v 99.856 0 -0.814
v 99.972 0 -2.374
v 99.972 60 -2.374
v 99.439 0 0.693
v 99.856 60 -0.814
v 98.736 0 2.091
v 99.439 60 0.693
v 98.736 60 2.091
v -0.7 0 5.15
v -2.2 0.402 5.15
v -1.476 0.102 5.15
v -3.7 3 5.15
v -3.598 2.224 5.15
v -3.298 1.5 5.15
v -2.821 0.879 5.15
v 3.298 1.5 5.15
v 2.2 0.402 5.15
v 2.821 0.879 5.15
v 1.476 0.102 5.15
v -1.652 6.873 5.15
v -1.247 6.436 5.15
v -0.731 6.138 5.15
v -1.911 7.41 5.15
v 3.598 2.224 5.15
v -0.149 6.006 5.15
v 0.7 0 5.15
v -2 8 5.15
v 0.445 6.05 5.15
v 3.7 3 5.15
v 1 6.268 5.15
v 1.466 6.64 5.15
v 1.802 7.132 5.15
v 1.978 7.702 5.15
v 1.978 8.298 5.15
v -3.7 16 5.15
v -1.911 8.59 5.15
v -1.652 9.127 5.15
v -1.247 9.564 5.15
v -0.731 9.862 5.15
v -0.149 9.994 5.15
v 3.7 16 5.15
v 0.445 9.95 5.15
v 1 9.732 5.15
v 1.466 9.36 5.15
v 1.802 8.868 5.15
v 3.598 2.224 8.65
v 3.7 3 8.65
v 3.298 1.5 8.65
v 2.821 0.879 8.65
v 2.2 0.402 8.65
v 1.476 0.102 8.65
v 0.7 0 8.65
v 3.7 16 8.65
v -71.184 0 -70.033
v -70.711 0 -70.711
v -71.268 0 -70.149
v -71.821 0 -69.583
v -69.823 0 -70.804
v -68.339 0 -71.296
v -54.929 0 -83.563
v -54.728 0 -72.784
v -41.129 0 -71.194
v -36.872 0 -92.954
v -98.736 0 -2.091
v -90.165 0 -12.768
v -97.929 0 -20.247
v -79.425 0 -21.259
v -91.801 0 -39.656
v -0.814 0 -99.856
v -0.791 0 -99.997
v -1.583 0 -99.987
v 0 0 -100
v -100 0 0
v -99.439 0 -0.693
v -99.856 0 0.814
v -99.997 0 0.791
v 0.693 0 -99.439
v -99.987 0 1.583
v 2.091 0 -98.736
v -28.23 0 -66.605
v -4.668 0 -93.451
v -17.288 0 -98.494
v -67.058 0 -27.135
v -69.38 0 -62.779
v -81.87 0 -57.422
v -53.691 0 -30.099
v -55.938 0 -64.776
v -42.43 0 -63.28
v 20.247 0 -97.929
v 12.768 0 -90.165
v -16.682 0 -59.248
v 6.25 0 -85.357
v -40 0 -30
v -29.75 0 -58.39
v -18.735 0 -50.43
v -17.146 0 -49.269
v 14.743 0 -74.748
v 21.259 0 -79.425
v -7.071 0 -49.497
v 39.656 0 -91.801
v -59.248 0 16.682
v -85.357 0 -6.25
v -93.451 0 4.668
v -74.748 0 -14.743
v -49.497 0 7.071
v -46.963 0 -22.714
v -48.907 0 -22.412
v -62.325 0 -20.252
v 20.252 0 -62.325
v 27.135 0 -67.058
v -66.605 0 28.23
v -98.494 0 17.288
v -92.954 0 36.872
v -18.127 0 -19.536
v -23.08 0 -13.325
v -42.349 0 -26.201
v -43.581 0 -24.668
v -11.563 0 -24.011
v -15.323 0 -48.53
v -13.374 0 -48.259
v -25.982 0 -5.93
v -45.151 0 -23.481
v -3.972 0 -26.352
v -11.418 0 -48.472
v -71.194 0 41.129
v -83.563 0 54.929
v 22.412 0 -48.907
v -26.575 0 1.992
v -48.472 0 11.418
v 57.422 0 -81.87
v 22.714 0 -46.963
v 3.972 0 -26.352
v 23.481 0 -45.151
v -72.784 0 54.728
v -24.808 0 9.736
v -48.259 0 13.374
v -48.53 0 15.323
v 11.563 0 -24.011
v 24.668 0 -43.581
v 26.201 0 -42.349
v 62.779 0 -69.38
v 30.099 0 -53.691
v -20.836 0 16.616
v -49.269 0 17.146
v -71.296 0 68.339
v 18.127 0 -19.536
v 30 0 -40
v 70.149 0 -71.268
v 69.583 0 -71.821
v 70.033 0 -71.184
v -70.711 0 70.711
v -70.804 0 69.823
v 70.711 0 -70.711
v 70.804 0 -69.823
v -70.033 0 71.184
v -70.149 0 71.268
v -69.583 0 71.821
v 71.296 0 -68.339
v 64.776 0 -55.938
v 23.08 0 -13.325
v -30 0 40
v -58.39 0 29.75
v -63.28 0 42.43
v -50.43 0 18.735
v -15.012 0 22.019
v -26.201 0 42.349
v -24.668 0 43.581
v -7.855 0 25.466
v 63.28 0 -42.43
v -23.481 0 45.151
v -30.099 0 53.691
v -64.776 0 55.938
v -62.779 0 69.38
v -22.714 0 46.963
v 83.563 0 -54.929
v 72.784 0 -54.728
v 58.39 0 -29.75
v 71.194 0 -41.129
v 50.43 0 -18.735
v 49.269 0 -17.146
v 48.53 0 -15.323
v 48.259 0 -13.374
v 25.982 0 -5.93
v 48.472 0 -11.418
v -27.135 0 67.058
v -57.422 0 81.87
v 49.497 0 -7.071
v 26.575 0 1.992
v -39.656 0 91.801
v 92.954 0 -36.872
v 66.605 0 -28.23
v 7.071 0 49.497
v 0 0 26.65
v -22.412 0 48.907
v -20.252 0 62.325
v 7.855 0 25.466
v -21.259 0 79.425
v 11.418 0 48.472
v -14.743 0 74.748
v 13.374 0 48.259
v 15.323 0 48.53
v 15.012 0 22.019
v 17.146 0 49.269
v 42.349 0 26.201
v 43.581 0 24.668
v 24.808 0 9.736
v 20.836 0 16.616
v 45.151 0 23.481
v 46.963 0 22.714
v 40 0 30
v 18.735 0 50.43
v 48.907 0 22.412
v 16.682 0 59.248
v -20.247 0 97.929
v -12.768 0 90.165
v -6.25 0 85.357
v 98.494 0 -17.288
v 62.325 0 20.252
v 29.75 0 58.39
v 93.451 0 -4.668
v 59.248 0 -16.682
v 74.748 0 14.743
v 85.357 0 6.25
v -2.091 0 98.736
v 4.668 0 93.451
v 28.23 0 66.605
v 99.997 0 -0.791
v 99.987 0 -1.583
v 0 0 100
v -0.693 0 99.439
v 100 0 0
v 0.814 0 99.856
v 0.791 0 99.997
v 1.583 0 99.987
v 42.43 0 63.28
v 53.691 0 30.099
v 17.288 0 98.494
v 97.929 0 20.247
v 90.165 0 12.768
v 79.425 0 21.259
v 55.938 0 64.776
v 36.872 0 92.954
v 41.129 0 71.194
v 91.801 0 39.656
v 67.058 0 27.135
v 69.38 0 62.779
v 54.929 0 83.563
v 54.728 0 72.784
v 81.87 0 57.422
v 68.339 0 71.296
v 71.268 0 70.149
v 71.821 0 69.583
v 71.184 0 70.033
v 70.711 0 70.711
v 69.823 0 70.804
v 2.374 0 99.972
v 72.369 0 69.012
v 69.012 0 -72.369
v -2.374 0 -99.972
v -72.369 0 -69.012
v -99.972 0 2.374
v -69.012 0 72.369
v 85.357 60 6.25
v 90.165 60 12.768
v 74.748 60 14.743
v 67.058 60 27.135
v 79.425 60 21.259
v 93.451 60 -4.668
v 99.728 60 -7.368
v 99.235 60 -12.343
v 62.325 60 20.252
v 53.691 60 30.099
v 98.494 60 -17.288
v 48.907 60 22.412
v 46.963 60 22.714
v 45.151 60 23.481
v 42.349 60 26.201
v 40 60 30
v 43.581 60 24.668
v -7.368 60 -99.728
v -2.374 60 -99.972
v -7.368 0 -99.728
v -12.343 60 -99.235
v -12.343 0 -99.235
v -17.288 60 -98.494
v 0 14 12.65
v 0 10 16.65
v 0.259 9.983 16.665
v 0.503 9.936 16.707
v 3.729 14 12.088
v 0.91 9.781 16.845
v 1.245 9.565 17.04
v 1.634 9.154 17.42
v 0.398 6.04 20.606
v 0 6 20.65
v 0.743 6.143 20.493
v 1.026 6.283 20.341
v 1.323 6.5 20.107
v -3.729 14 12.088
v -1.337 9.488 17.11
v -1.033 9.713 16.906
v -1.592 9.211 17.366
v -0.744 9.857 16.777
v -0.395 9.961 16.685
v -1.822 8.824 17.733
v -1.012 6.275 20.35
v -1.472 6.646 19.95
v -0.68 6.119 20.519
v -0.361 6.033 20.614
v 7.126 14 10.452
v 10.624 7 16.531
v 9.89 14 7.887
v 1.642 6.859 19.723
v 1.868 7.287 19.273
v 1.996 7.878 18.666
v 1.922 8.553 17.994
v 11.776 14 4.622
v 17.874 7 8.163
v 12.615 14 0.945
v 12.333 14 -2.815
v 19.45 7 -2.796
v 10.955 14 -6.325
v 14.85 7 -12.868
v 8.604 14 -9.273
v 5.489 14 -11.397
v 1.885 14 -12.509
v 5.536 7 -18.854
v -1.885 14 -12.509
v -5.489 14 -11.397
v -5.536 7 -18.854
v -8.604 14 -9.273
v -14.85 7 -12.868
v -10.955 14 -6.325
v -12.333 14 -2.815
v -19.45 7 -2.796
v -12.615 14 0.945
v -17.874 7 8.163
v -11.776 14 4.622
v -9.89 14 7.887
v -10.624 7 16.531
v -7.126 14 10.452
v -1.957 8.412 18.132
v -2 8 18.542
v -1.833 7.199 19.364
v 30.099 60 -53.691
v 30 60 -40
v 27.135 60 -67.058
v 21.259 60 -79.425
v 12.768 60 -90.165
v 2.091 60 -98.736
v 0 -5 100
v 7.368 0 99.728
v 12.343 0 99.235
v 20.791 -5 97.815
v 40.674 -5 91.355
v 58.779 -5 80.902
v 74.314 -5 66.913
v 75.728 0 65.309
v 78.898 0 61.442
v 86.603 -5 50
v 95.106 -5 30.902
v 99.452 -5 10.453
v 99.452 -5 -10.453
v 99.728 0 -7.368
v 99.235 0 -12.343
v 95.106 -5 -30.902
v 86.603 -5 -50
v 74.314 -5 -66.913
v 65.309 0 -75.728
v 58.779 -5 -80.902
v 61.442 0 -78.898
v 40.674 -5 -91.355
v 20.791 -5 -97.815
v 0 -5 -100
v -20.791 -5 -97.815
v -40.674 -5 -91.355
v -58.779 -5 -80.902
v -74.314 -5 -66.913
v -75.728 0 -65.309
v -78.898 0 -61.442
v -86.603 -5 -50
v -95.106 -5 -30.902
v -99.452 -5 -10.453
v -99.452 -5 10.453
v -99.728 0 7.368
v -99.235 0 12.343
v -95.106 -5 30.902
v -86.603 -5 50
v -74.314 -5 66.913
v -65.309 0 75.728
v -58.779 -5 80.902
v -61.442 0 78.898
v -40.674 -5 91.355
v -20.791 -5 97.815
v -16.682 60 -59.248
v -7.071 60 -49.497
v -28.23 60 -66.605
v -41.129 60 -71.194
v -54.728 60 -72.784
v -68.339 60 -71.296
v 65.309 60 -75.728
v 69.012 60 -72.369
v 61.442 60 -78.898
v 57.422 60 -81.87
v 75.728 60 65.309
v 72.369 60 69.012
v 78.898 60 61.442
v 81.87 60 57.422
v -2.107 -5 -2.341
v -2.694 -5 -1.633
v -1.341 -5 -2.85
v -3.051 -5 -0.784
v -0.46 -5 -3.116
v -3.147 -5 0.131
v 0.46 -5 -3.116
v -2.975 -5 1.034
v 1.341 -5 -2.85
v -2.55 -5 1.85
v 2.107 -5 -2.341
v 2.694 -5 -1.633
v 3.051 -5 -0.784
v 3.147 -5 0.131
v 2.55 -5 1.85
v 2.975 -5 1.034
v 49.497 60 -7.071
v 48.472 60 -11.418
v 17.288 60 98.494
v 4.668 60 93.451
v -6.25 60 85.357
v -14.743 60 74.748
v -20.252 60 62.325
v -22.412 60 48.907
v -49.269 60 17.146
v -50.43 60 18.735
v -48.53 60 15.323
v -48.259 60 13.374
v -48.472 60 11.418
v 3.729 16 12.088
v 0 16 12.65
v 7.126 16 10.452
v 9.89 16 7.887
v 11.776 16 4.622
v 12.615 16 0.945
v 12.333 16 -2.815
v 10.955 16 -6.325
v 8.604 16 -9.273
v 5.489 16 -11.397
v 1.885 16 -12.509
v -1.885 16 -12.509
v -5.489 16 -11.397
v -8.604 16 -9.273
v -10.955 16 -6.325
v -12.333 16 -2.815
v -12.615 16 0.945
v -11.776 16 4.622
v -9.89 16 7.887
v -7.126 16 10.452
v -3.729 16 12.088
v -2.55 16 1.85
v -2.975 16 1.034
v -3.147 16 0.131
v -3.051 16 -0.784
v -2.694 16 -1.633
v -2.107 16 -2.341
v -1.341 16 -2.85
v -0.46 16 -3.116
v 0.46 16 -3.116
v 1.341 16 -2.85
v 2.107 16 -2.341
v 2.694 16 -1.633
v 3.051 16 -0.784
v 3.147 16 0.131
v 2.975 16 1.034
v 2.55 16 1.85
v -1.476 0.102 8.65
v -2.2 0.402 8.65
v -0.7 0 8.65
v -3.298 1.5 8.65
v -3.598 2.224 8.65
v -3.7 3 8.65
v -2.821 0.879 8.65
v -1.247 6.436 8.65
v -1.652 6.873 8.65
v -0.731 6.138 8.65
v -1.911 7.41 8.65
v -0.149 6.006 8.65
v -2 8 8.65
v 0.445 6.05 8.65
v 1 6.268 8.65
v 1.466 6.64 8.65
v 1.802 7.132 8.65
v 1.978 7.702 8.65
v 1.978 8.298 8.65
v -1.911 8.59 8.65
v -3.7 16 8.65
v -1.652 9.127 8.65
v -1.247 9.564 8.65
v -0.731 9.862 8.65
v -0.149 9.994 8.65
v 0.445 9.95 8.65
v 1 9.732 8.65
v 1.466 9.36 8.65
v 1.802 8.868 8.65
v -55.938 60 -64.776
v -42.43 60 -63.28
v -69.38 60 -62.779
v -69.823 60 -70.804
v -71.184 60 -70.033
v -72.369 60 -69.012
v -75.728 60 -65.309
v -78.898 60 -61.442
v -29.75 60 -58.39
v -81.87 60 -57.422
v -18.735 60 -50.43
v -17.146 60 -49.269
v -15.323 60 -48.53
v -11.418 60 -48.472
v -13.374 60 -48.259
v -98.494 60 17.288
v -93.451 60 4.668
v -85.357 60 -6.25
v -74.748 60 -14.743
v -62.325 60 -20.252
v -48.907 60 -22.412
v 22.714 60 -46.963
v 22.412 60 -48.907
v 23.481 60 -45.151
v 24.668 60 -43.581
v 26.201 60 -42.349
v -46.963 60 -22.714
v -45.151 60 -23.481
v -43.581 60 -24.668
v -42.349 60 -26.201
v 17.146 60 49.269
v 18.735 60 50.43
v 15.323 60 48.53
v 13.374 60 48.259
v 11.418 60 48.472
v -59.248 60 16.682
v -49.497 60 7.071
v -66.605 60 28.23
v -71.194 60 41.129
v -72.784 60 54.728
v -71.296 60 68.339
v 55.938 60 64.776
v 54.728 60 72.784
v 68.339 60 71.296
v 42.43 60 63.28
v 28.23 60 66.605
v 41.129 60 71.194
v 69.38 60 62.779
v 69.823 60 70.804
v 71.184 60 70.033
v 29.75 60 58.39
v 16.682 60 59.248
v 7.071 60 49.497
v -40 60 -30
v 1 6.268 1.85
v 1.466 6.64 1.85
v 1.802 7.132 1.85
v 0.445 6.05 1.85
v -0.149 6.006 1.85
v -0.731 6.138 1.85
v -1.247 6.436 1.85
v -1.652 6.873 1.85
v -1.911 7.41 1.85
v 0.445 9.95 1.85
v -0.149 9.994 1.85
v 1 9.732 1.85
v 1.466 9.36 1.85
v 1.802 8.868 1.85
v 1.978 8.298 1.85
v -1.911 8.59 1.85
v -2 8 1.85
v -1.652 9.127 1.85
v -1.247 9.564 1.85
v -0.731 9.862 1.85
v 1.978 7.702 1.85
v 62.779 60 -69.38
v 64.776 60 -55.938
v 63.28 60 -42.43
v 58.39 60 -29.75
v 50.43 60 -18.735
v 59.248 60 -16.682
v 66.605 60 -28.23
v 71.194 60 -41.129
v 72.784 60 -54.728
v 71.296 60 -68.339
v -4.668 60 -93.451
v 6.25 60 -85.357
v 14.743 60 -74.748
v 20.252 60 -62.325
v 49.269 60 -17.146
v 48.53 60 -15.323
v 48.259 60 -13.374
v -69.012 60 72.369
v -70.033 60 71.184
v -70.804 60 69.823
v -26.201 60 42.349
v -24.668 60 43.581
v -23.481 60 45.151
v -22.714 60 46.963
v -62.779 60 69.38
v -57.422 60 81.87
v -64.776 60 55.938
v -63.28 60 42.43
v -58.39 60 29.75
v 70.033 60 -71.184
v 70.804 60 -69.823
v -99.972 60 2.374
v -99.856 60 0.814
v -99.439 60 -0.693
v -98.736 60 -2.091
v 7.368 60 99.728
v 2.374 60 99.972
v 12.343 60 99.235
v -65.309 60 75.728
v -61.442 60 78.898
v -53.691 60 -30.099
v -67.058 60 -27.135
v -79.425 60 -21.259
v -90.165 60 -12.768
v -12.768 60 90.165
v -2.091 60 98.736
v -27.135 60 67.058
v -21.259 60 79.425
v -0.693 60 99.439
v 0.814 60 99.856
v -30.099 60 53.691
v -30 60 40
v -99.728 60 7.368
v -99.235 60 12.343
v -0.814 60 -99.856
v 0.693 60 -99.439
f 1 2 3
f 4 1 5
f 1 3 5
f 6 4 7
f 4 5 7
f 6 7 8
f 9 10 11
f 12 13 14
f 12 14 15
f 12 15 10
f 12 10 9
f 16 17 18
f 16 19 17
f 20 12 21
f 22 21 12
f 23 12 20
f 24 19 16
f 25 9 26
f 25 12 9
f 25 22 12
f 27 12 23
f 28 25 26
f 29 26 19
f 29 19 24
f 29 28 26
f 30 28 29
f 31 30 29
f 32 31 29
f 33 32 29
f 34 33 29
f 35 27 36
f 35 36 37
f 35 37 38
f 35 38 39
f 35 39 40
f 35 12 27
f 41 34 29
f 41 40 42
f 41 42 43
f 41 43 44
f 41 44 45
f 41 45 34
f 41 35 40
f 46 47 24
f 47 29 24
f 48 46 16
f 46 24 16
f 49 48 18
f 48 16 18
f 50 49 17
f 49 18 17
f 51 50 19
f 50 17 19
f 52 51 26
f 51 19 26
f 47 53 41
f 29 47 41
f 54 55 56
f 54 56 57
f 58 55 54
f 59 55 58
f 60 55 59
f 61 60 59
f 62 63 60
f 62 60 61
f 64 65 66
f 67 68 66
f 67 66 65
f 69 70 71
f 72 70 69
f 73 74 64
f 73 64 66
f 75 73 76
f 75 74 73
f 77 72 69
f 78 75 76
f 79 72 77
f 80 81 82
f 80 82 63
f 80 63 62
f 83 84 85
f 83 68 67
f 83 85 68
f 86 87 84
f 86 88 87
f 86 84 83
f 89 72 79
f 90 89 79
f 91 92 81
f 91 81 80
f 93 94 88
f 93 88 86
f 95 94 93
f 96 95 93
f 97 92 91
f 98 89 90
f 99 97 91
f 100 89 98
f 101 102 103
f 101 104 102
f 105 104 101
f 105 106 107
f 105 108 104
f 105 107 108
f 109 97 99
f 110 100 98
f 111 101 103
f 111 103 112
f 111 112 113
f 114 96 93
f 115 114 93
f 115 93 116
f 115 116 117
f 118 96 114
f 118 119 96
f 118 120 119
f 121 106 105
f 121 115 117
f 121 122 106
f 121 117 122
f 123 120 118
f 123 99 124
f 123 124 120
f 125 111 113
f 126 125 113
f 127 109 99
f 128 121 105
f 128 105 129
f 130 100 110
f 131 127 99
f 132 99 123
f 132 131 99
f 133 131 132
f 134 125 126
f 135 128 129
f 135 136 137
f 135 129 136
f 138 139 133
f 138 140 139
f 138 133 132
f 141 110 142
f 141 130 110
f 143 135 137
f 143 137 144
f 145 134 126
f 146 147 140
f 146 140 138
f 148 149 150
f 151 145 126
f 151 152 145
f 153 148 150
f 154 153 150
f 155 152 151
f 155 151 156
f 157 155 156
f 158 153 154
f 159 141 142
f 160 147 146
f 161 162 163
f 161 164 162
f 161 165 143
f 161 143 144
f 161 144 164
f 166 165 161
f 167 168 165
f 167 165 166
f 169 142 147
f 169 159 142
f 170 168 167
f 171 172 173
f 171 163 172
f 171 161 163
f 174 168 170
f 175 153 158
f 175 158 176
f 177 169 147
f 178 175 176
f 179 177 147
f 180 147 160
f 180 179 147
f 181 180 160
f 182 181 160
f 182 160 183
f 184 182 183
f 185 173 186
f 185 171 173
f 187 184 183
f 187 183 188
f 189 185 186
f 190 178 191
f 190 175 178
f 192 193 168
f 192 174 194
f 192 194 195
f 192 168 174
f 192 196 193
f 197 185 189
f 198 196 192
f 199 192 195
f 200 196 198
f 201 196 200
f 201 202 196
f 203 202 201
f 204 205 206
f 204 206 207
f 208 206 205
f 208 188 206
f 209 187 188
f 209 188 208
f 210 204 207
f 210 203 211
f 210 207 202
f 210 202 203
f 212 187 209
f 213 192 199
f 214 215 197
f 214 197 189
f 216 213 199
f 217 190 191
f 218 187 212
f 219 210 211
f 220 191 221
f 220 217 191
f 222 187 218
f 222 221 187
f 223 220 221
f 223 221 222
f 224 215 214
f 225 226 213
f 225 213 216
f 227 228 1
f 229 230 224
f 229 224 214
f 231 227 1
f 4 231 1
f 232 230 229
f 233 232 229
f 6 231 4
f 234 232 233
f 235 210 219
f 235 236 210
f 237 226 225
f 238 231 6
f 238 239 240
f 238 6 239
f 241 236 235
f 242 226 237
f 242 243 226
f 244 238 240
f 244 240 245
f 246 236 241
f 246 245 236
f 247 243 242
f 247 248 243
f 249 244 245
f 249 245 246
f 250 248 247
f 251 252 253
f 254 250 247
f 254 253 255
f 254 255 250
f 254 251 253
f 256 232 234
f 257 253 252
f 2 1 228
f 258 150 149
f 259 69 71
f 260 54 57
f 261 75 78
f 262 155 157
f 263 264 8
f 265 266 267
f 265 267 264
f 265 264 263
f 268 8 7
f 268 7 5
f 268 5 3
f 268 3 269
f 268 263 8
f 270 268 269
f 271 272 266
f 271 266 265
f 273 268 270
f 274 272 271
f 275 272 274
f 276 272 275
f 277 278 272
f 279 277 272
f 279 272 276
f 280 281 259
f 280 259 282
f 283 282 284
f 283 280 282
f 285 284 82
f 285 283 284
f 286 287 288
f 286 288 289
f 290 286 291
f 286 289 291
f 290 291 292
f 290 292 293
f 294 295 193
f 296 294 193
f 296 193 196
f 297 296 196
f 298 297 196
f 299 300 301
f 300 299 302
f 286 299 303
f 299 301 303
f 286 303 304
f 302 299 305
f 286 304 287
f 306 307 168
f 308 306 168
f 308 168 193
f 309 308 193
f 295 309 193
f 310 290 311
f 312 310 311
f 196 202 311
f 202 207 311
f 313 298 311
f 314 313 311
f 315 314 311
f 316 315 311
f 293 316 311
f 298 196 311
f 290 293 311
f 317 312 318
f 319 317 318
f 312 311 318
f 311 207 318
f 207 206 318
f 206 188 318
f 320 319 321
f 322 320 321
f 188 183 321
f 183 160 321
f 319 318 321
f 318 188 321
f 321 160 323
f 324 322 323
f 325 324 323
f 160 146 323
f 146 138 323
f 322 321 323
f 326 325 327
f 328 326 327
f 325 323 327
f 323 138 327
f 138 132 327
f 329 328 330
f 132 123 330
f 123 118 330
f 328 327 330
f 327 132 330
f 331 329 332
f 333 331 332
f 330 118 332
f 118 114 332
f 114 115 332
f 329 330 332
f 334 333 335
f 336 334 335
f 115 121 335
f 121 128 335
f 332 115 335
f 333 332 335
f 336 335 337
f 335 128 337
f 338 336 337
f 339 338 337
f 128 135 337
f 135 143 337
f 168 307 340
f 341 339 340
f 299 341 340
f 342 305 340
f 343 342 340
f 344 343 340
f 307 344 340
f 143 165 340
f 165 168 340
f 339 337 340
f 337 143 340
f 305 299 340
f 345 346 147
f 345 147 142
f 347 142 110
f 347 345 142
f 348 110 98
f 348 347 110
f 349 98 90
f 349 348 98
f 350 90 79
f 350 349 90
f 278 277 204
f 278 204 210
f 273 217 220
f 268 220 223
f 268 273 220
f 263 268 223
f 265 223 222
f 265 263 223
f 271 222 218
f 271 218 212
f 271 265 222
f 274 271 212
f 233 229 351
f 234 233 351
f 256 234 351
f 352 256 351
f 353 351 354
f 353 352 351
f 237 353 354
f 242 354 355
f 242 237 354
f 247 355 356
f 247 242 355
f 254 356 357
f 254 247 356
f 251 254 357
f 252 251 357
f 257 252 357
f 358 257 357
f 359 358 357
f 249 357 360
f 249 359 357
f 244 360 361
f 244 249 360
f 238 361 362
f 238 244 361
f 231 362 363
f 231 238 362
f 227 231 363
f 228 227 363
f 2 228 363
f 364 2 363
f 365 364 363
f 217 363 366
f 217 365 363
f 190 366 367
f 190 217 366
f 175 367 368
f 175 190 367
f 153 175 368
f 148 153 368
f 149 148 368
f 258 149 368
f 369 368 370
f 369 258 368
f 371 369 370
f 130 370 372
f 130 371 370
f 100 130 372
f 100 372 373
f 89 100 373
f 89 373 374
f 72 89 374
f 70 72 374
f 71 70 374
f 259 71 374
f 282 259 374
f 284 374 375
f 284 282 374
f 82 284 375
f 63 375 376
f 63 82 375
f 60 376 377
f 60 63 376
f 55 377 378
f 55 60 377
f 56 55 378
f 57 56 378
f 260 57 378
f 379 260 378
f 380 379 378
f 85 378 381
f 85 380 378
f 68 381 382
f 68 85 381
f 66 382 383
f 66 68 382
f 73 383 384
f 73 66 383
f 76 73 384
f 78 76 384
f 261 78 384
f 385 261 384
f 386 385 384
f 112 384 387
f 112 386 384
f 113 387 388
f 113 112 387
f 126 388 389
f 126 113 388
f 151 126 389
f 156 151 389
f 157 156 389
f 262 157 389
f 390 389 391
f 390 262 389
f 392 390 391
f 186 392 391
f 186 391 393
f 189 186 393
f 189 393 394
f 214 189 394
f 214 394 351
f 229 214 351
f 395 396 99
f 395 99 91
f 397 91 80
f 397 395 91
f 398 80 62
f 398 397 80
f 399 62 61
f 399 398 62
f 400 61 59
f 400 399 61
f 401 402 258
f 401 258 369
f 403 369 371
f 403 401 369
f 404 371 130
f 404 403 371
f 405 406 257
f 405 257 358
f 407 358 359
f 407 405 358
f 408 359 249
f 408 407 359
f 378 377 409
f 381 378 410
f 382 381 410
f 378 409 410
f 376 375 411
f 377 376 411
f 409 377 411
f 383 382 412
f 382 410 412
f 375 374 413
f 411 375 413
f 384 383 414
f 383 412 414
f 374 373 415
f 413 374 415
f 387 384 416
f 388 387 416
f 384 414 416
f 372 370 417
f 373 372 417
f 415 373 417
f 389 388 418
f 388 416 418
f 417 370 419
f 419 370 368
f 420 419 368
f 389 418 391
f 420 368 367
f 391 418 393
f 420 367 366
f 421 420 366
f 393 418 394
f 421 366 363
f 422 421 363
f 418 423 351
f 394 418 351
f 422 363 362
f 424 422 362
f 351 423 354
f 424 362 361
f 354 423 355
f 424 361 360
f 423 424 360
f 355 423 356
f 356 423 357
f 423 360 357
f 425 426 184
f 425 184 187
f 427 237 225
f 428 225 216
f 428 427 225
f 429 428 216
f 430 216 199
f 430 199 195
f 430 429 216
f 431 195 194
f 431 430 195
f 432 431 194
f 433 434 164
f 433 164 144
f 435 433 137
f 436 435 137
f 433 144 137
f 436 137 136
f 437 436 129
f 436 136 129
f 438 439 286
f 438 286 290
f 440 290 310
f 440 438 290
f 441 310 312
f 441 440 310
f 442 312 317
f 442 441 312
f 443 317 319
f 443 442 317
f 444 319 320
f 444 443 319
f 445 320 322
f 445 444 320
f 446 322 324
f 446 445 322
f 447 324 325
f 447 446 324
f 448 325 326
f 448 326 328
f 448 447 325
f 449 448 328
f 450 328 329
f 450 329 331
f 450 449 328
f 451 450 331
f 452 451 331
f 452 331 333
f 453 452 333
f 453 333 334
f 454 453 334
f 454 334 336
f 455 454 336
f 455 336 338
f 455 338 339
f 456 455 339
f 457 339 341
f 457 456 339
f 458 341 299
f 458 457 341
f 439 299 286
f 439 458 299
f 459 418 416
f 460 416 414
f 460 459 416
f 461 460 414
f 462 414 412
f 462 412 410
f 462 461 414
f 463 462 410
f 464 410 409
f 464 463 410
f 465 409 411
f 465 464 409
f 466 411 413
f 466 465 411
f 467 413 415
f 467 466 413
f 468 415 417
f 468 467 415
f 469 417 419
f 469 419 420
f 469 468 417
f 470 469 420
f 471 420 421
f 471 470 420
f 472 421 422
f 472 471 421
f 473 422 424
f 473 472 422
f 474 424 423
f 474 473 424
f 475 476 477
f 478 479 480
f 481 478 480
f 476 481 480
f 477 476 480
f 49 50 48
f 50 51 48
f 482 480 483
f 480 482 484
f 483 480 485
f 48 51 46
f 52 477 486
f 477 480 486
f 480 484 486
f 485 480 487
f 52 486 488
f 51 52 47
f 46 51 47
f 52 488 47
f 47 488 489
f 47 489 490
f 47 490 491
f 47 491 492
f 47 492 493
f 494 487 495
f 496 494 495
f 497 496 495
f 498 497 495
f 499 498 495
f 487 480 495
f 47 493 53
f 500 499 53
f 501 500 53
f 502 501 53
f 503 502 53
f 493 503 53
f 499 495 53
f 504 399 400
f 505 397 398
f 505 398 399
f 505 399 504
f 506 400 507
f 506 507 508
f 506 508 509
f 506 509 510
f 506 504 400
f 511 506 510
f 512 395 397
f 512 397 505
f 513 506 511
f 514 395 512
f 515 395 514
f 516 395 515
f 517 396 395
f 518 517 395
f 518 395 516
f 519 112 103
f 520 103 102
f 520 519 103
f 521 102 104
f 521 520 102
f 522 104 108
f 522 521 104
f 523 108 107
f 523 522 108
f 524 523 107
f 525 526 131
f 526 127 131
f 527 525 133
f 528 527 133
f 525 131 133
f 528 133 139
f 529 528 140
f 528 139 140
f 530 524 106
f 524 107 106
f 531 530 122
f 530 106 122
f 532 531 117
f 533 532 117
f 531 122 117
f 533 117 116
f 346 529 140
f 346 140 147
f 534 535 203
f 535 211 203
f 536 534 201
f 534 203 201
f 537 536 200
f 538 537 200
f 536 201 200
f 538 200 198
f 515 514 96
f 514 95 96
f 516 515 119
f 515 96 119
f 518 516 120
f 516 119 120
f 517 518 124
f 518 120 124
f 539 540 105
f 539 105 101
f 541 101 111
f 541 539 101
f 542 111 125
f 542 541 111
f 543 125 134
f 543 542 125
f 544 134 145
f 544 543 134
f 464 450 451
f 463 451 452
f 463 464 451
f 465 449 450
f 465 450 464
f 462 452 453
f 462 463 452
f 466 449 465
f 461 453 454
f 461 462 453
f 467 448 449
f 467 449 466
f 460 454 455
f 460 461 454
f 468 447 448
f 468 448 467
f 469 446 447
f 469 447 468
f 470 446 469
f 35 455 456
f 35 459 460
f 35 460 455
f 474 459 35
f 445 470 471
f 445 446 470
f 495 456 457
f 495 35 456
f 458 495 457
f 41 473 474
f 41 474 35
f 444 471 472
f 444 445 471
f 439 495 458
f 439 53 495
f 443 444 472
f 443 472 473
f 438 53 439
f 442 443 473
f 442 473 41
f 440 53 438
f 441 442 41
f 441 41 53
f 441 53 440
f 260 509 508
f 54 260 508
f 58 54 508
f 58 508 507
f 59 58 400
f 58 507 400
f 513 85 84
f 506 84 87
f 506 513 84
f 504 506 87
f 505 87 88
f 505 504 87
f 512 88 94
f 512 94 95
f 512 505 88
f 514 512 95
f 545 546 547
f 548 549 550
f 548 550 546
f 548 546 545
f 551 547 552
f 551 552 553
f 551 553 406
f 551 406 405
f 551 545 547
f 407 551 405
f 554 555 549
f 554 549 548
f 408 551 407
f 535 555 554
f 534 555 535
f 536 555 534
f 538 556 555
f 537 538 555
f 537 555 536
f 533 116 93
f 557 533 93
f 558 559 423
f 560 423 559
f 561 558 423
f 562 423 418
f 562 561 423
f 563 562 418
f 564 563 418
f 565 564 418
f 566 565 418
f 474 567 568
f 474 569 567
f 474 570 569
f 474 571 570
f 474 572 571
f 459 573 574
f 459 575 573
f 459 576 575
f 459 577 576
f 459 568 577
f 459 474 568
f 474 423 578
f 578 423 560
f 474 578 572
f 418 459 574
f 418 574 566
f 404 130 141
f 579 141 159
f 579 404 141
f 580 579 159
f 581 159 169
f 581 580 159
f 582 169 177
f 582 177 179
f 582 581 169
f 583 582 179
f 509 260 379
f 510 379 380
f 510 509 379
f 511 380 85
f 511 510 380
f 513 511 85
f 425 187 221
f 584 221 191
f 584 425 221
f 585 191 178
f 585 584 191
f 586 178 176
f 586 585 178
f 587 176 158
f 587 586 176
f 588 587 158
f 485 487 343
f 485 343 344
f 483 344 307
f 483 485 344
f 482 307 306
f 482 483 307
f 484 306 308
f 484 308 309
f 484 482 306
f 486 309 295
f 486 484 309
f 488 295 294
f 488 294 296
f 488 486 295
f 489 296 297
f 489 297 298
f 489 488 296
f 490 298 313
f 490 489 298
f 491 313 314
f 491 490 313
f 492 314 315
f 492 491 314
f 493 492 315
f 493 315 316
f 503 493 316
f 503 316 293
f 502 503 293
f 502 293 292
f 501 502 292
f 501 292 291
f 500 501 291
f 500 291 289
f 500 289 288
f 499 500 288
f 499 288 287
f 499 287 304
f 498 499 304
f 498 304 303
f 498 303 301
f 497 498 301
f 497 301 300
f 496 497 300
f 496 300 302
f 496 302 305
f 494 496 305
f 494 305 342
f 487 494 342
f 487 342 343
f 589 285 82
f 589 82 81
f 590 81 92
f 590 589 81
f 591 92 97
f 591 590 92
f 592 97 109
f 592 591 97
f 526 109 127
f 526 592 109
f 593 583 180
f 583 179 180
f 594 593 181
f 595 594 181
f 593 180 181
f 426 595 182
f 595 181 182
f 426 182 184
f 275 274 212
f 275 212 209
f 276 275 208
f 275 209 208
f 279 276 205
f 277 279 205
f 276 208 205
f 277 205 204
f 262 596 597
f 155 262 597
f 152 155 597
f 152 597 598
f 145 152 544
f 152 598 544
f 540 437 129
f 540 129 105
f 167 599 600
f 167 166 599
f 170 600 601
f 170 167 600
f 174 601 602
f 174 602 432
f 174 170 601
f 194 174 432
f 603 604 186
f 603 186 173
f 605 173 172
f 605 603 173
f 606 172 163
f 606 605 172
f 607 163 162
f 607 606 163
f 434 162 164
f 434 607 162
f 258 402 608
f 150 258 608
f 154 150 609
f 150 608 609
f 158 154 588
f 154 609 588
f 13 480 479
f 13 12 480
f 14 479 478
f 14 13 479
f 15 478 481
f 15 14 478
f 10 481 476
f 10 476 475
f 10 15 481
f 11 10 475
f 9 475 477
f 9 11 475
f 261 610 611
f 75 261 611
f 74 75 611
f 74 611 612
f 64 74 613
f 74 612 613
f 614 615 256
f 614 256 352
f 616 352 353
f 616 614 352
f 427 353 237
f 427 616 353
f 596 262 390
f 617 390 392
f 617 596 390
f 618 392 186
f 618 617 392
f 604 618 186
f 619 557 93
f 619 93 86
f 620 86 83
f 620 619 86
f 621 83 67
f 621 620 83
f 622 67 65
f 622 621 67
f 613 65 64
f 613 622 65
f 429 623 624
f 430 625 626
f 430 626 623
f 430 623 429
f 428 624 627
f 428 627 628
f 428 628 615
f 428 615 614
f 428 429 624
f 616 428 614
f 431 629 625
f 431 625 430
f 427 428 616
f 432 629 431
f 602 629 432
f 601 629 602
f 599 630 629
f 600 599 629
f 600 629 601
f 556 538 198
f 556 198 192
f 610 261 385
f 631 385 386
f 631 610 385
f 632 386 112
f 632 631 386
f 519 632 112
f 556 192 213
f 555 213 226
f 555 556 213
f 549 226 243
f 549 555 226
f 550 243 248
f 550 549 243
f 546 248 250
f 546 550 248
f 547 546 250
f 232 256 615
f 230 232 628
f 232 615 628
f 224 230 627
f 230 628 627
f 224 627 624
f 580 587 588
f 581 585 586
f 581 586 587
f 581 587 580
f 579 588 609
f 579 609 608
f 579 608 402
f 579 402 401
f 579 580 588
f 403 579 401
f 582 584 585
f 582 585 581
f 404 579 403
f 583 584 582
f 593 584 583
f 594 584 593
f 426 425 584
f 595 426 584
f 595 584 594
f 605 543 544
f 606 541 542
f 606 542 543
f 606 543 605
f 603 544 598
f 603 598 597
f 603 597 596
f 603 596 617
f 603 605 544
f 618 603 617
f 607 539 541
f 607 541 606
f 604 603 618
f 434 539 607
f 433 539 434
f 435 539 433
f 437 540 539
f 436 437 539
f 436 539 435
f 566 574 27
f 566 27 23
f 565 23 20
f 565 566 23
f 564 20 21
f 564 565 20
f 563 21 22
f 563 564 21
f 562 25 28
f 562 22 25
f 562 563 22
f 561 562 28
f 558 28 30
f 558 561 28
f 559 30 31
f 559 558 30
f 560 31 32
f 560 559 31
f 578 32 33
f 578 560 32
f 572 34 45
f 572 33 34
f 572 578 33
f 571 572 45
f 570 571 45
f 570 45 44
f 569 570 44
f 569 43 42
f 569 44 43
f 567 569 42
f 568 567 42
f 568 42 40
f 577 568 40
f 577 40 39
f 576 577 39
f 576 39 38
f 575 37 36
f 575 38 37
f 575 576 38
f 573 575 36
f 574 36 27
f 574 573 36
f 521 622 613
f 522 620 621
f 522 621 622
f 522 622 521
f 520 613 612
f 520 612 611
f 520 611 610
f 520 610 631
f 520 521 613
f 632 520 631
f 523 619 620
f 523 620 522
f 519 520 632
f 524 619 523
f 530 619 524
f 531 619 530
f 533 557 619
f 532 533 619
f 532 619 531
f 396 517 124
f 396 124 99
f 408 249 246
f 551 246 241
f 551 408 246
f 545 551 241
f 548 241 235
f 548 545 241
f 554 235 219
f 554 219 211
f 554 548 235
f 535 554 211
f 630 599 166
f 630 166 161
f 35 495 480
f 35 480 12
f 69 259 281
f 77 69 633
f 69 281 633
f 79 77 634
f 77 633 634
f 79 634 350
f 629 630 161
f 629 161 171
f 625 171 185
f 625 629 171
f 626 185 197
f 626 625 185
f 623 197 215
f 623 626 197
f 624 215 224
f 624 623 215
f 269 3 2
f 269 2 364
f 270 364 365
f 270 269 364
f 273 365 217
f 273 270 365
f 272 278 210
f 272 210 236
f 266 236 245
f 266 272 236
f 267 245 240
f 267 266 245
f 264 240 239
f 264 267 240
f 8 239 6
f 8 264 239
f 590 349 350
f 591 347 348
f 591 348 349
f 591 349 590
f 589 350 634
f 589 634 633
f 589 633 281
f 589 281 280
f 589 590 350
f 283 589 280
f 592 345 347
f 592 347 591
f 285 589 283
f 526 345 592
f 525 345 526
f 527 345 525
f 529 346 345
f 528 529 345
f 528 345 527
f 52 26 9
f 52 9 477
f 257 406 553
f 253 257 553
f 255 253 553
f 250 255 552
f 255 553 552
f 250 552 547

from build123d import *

# Parameters (mm, degrees)
SKETCH1_R                = 100
BOSS_EXTRUDE1_DEPTH      = 5
BOSS_EXTRUDE2_START      = 16
SKETCH1_3_R              = 12.65
SKETCH1_3_W              = 7.4
SKETCH1_3_H              = 3.5
BOSS_EXTRUDE2_DEPTH      = 16
CHAMFER1_SIZE            = 14
CUT_EXTRUDE1_DEPTH       = 146.988090268
CUT_EXTRUDE1_DEPTH_BACK  = 5.15
SKETCH3_R                = 2
FILLET1_R                = 3
BOSS_EXTRUDE3_START      = 60
BOSS_EXTRUDE3_DEPTH      = 60
FILLET3_R                = 8
FILLET4_R                = 8
CIRPATTERN1_COUNT        = 8
FILLET3_OF_CIRPATTERN1_R = 8
FILLET4_OF_CIRPATTERN1_R = 8


with BuildPart() as part:
    # Sketch1 → Boss-Extrude1 (new body)
    with BuildSketch(Plane(origin=(0, 0, 0), x_dir=(1, 0, 0), z_dir=(0, 1, 0))):
        with Locations(Location((0, 0, 0), (0, 0, 270))):
            Circle(SKETCH1_R)
        with BuildLine():
            Line((2.549509757, -1.85), (-2.549509757, -1.85))
            ThreePointArc((-2.549509757, -1.85), (0, 3.15), (2.549509757, -1.85))
        make_face(mode=Mode.SUBTRACT)
    extrude(amount=-BOSS_EXTRUDE1_DEPTH)

    # Sketch1<3> → Boss-Extrude2 (add)
    with BuildSketch(Plane(origin=(0, 0, 0), x_dir=(1, 0, 0), z_dir=(0, 1, 0)).offset(BOSS_EXTRUDE2_START)):
        with Locations(Location((0, 0, 0), (0, 0, 270))):
            Circle(SKETCH1_3_R)
        with BuildLine():
            Line((2.549509757, -1.85), (-2.549509757, -1.85))
            ThreePointArc((-2.549509757, -1.85), (0, 3.15), (2.549509757, -1.85))
        make_face(mode=Mode.SUBTRACT)
        with Locations((0, -6.9)):
            Rectangle(SKETCH1_3_W, SKETCH1_3_H, mode=Mode.SUBTRACT)
    extrude(amount=-BOSS_EXTRUDE2_DEPTH)

    # Chamfer1
    chamfer1_edges = [part.edges().sort_by_distance(p)[0] for p in [
        (0, 0, -12.65),
    ]]
    chamfer(chamfer1_edges, length=CHAMFER1_SIZE)

    # Sketch3 → Cut-Extrude1 (cut, two sides: drawn at the far end of the back side and taken through both)
    with BuildSketch(Plane.XY.offset(5.15).offset(-CUT_EXTRUDE1_DEPTH_BACK)):
        with Locations(Location((0, 8, 0), (0, 0, 180))):
            Circle(SKETCH3_R)
    extrude(amount=CUT_EXTRUDE1_DEPTH + CUT_EXTRUDE1_DEPTH_BACK, mode=Mode.SUBTRACT)

    # Fillet1
    fillet1_edges = [part.edges().sort_by_distance(p)[0] for p in [
        (3.7, 0, 6.9),
        (-3.7, 0, 6.9),
    ]]
    fillet(fillet1_edges, radius=FILLET1_R)

    # Sketch4 → Boss-Extrude3 (add)
    with BuildSketch(Plane(origin=(0, 0, 0), x_dir=(1, 0, 0), z_dir=(0, 1, 0)).offset(BOSS_EXTRUDE3_START)):
        with BuildLine():
            Line((-22.374700612, -44.714346384), (-30, -40))
            ThreePointArc((-30, -40), (-24.010405369, -74.505202685), (0, -100))
            ThreePointArc((0, -100), (8.67647844, -99.622882521), (17.287515846, -98.494374438))
            ThreePointArc((17.287515846, -98.494374438), (-12.116392899, -78.664202138), (-22.374700612, -44.714346384))
        make_face()
    boss_extrude3 = extrude(amount=-BOSS_EXTRUDE3_DEPTH)

    # Fillet3
    fillet3_edges = [part.edges().sort_by_distance(p)[0] for p in [
        (-22.374700612, 30, 44.714346384),
    ]]
    fillet(fillet3_edges, radius=FILLET3_R)

    # Fillet4
    # the kernel refuses this fillet: 8 mm, written as the material it takes off along each edge
    with BuildSketch(Plane(origin=(0, 66.107971256, 100), x_dir=(0.999929553100501, 0, -0.01186966032505709), z_dir=(0, -1, 0))) as fillet4_piece_1:
        with BuildLine():
            CenterArc((2.278974782, -7.999436425), FILLET4_R, 89.319902589, 33.659920931)
            ThreePointArc((-2.075774552, -1.288537958), (-1.044352376, -0.633854003), (0, 0))
            ThreePointArc((0, 0), (1.186966033, 0.00704469), (2.373932065, 0))
        make_face()
    extrude(amount=66.107971256, mode=Mode.SUBTRACT)

    # CirPattern1: Boss-Extrude3 ×8 about axis
    cirpattern1_axis = Axis((0, 0, 0), (0, 1, 0))
    for i in range(1, CIRPATTERN1_COUNT):
        add(boss_extrude3.rotate(cirpattern1_axis, i * 360 / CIRPATTERN1_COUNT))

    # Fillet3 of CirPattern1
    fillet3_of_cirpattern1_edges = [part.edges().sort_by_distance(p)[0] for p in [
        (15.796515014, 30, 47.439120074),
        (44.714346384, 30, 22.374700612),
        (47.439120074, 30, -15.796515014),
        (22.374700612, 30, -44.714346384),
        (-15.796515014, 30, -47.439120074),
        (-44.714346384, 30, -22.374700612),
        (-47.439120074, 30, 15.796515014),
    ]]
    fillet(fillet3_of_cirpattern1_edges, radius=FILLET3_OF_CIRPATTERN1_R)

    # Fillet4 of CirPattern1
    # the kernel refuses this fillet: 8 mm, written as the material it takes off along each edge
    with BuildSketch(Plane(origin=(70.710678119, 66.107971256, 70.710678119), x_dir=(0.6986638503999697, 0, -0.7154500850124269), z_dir=(0, -1, 0)), Plane(origin=(100, 66.107971256, 0), x_dir=(-0.01186966032505703, 0, -0.9999295531005011), z_dir=(0, -1, 0)), Plane(origin=(70.710678119, 66.107971256, -70.710678119), x_dir=(-0.7154500850124297, 0, -0.6986638503999666), z_dir=(0, -1, 0)), Plane(origin=(0, 66.107971256, -100), x_dir=(-0.999929553100501, 0, 0.011869660325056916), z_dir=(0, -1, 0))) as fillet4_of_cirpattern1_piece_1:
        with BuildLine():
            CenterArc((2.278974782, -7.999436425), FILLET4_OF_CIRPATTERN1_R, 89.319902589, 33.659920931)
            ThreePointArc((-2.075774552, -1.288537958), (-1.044352376, -0.633854003), (0, 0))
            ThreePointArc((0, 0), (1.186966033, 0.00704469), (2.373932065, 0))
        make_face()
    extrude(amount=66.107971256, mode=Mode.SUBTRACT)
    with BuildSketch(Plane(origin=(-70.710678119, 66.107971256, -70.710678119), x_dir=(0.9709251782861501, 0, -0.23938316183476163), z_dir=(0, -1, 0)), Plane(origin=(-100, 66.107971256, 0), x_dir=(0.517278320555659, 0, -0.8558172346261301), z_dir=(0, -1, 0)), Plane(origin=(-70.710678119, 66.107971256, 70.710678119), x_dir=(-0.23938316183476574, 0, -0.9709251782861491), z_dir=(0, -1, 0))) as fillet4_of_cirpattern1_piece_2:
        with BuildLine():
            CenterArc((2.282648109, 7.998389012), FILLET4_OF_CIRPATTERN1_R, 237.489942123, 33.659920931)
            ThreePointArc((-2.016933103, 1.252012103), (-1.012181922, 0.620020763), (0, 0))
            ThreePointArc((0, 0), (1.221594251, -0.012258436), (2.443188502, 0))
        make_face()
    extrude(amount=66.107971256, mode=Mode.SUBTRACT)


solid = part.part
